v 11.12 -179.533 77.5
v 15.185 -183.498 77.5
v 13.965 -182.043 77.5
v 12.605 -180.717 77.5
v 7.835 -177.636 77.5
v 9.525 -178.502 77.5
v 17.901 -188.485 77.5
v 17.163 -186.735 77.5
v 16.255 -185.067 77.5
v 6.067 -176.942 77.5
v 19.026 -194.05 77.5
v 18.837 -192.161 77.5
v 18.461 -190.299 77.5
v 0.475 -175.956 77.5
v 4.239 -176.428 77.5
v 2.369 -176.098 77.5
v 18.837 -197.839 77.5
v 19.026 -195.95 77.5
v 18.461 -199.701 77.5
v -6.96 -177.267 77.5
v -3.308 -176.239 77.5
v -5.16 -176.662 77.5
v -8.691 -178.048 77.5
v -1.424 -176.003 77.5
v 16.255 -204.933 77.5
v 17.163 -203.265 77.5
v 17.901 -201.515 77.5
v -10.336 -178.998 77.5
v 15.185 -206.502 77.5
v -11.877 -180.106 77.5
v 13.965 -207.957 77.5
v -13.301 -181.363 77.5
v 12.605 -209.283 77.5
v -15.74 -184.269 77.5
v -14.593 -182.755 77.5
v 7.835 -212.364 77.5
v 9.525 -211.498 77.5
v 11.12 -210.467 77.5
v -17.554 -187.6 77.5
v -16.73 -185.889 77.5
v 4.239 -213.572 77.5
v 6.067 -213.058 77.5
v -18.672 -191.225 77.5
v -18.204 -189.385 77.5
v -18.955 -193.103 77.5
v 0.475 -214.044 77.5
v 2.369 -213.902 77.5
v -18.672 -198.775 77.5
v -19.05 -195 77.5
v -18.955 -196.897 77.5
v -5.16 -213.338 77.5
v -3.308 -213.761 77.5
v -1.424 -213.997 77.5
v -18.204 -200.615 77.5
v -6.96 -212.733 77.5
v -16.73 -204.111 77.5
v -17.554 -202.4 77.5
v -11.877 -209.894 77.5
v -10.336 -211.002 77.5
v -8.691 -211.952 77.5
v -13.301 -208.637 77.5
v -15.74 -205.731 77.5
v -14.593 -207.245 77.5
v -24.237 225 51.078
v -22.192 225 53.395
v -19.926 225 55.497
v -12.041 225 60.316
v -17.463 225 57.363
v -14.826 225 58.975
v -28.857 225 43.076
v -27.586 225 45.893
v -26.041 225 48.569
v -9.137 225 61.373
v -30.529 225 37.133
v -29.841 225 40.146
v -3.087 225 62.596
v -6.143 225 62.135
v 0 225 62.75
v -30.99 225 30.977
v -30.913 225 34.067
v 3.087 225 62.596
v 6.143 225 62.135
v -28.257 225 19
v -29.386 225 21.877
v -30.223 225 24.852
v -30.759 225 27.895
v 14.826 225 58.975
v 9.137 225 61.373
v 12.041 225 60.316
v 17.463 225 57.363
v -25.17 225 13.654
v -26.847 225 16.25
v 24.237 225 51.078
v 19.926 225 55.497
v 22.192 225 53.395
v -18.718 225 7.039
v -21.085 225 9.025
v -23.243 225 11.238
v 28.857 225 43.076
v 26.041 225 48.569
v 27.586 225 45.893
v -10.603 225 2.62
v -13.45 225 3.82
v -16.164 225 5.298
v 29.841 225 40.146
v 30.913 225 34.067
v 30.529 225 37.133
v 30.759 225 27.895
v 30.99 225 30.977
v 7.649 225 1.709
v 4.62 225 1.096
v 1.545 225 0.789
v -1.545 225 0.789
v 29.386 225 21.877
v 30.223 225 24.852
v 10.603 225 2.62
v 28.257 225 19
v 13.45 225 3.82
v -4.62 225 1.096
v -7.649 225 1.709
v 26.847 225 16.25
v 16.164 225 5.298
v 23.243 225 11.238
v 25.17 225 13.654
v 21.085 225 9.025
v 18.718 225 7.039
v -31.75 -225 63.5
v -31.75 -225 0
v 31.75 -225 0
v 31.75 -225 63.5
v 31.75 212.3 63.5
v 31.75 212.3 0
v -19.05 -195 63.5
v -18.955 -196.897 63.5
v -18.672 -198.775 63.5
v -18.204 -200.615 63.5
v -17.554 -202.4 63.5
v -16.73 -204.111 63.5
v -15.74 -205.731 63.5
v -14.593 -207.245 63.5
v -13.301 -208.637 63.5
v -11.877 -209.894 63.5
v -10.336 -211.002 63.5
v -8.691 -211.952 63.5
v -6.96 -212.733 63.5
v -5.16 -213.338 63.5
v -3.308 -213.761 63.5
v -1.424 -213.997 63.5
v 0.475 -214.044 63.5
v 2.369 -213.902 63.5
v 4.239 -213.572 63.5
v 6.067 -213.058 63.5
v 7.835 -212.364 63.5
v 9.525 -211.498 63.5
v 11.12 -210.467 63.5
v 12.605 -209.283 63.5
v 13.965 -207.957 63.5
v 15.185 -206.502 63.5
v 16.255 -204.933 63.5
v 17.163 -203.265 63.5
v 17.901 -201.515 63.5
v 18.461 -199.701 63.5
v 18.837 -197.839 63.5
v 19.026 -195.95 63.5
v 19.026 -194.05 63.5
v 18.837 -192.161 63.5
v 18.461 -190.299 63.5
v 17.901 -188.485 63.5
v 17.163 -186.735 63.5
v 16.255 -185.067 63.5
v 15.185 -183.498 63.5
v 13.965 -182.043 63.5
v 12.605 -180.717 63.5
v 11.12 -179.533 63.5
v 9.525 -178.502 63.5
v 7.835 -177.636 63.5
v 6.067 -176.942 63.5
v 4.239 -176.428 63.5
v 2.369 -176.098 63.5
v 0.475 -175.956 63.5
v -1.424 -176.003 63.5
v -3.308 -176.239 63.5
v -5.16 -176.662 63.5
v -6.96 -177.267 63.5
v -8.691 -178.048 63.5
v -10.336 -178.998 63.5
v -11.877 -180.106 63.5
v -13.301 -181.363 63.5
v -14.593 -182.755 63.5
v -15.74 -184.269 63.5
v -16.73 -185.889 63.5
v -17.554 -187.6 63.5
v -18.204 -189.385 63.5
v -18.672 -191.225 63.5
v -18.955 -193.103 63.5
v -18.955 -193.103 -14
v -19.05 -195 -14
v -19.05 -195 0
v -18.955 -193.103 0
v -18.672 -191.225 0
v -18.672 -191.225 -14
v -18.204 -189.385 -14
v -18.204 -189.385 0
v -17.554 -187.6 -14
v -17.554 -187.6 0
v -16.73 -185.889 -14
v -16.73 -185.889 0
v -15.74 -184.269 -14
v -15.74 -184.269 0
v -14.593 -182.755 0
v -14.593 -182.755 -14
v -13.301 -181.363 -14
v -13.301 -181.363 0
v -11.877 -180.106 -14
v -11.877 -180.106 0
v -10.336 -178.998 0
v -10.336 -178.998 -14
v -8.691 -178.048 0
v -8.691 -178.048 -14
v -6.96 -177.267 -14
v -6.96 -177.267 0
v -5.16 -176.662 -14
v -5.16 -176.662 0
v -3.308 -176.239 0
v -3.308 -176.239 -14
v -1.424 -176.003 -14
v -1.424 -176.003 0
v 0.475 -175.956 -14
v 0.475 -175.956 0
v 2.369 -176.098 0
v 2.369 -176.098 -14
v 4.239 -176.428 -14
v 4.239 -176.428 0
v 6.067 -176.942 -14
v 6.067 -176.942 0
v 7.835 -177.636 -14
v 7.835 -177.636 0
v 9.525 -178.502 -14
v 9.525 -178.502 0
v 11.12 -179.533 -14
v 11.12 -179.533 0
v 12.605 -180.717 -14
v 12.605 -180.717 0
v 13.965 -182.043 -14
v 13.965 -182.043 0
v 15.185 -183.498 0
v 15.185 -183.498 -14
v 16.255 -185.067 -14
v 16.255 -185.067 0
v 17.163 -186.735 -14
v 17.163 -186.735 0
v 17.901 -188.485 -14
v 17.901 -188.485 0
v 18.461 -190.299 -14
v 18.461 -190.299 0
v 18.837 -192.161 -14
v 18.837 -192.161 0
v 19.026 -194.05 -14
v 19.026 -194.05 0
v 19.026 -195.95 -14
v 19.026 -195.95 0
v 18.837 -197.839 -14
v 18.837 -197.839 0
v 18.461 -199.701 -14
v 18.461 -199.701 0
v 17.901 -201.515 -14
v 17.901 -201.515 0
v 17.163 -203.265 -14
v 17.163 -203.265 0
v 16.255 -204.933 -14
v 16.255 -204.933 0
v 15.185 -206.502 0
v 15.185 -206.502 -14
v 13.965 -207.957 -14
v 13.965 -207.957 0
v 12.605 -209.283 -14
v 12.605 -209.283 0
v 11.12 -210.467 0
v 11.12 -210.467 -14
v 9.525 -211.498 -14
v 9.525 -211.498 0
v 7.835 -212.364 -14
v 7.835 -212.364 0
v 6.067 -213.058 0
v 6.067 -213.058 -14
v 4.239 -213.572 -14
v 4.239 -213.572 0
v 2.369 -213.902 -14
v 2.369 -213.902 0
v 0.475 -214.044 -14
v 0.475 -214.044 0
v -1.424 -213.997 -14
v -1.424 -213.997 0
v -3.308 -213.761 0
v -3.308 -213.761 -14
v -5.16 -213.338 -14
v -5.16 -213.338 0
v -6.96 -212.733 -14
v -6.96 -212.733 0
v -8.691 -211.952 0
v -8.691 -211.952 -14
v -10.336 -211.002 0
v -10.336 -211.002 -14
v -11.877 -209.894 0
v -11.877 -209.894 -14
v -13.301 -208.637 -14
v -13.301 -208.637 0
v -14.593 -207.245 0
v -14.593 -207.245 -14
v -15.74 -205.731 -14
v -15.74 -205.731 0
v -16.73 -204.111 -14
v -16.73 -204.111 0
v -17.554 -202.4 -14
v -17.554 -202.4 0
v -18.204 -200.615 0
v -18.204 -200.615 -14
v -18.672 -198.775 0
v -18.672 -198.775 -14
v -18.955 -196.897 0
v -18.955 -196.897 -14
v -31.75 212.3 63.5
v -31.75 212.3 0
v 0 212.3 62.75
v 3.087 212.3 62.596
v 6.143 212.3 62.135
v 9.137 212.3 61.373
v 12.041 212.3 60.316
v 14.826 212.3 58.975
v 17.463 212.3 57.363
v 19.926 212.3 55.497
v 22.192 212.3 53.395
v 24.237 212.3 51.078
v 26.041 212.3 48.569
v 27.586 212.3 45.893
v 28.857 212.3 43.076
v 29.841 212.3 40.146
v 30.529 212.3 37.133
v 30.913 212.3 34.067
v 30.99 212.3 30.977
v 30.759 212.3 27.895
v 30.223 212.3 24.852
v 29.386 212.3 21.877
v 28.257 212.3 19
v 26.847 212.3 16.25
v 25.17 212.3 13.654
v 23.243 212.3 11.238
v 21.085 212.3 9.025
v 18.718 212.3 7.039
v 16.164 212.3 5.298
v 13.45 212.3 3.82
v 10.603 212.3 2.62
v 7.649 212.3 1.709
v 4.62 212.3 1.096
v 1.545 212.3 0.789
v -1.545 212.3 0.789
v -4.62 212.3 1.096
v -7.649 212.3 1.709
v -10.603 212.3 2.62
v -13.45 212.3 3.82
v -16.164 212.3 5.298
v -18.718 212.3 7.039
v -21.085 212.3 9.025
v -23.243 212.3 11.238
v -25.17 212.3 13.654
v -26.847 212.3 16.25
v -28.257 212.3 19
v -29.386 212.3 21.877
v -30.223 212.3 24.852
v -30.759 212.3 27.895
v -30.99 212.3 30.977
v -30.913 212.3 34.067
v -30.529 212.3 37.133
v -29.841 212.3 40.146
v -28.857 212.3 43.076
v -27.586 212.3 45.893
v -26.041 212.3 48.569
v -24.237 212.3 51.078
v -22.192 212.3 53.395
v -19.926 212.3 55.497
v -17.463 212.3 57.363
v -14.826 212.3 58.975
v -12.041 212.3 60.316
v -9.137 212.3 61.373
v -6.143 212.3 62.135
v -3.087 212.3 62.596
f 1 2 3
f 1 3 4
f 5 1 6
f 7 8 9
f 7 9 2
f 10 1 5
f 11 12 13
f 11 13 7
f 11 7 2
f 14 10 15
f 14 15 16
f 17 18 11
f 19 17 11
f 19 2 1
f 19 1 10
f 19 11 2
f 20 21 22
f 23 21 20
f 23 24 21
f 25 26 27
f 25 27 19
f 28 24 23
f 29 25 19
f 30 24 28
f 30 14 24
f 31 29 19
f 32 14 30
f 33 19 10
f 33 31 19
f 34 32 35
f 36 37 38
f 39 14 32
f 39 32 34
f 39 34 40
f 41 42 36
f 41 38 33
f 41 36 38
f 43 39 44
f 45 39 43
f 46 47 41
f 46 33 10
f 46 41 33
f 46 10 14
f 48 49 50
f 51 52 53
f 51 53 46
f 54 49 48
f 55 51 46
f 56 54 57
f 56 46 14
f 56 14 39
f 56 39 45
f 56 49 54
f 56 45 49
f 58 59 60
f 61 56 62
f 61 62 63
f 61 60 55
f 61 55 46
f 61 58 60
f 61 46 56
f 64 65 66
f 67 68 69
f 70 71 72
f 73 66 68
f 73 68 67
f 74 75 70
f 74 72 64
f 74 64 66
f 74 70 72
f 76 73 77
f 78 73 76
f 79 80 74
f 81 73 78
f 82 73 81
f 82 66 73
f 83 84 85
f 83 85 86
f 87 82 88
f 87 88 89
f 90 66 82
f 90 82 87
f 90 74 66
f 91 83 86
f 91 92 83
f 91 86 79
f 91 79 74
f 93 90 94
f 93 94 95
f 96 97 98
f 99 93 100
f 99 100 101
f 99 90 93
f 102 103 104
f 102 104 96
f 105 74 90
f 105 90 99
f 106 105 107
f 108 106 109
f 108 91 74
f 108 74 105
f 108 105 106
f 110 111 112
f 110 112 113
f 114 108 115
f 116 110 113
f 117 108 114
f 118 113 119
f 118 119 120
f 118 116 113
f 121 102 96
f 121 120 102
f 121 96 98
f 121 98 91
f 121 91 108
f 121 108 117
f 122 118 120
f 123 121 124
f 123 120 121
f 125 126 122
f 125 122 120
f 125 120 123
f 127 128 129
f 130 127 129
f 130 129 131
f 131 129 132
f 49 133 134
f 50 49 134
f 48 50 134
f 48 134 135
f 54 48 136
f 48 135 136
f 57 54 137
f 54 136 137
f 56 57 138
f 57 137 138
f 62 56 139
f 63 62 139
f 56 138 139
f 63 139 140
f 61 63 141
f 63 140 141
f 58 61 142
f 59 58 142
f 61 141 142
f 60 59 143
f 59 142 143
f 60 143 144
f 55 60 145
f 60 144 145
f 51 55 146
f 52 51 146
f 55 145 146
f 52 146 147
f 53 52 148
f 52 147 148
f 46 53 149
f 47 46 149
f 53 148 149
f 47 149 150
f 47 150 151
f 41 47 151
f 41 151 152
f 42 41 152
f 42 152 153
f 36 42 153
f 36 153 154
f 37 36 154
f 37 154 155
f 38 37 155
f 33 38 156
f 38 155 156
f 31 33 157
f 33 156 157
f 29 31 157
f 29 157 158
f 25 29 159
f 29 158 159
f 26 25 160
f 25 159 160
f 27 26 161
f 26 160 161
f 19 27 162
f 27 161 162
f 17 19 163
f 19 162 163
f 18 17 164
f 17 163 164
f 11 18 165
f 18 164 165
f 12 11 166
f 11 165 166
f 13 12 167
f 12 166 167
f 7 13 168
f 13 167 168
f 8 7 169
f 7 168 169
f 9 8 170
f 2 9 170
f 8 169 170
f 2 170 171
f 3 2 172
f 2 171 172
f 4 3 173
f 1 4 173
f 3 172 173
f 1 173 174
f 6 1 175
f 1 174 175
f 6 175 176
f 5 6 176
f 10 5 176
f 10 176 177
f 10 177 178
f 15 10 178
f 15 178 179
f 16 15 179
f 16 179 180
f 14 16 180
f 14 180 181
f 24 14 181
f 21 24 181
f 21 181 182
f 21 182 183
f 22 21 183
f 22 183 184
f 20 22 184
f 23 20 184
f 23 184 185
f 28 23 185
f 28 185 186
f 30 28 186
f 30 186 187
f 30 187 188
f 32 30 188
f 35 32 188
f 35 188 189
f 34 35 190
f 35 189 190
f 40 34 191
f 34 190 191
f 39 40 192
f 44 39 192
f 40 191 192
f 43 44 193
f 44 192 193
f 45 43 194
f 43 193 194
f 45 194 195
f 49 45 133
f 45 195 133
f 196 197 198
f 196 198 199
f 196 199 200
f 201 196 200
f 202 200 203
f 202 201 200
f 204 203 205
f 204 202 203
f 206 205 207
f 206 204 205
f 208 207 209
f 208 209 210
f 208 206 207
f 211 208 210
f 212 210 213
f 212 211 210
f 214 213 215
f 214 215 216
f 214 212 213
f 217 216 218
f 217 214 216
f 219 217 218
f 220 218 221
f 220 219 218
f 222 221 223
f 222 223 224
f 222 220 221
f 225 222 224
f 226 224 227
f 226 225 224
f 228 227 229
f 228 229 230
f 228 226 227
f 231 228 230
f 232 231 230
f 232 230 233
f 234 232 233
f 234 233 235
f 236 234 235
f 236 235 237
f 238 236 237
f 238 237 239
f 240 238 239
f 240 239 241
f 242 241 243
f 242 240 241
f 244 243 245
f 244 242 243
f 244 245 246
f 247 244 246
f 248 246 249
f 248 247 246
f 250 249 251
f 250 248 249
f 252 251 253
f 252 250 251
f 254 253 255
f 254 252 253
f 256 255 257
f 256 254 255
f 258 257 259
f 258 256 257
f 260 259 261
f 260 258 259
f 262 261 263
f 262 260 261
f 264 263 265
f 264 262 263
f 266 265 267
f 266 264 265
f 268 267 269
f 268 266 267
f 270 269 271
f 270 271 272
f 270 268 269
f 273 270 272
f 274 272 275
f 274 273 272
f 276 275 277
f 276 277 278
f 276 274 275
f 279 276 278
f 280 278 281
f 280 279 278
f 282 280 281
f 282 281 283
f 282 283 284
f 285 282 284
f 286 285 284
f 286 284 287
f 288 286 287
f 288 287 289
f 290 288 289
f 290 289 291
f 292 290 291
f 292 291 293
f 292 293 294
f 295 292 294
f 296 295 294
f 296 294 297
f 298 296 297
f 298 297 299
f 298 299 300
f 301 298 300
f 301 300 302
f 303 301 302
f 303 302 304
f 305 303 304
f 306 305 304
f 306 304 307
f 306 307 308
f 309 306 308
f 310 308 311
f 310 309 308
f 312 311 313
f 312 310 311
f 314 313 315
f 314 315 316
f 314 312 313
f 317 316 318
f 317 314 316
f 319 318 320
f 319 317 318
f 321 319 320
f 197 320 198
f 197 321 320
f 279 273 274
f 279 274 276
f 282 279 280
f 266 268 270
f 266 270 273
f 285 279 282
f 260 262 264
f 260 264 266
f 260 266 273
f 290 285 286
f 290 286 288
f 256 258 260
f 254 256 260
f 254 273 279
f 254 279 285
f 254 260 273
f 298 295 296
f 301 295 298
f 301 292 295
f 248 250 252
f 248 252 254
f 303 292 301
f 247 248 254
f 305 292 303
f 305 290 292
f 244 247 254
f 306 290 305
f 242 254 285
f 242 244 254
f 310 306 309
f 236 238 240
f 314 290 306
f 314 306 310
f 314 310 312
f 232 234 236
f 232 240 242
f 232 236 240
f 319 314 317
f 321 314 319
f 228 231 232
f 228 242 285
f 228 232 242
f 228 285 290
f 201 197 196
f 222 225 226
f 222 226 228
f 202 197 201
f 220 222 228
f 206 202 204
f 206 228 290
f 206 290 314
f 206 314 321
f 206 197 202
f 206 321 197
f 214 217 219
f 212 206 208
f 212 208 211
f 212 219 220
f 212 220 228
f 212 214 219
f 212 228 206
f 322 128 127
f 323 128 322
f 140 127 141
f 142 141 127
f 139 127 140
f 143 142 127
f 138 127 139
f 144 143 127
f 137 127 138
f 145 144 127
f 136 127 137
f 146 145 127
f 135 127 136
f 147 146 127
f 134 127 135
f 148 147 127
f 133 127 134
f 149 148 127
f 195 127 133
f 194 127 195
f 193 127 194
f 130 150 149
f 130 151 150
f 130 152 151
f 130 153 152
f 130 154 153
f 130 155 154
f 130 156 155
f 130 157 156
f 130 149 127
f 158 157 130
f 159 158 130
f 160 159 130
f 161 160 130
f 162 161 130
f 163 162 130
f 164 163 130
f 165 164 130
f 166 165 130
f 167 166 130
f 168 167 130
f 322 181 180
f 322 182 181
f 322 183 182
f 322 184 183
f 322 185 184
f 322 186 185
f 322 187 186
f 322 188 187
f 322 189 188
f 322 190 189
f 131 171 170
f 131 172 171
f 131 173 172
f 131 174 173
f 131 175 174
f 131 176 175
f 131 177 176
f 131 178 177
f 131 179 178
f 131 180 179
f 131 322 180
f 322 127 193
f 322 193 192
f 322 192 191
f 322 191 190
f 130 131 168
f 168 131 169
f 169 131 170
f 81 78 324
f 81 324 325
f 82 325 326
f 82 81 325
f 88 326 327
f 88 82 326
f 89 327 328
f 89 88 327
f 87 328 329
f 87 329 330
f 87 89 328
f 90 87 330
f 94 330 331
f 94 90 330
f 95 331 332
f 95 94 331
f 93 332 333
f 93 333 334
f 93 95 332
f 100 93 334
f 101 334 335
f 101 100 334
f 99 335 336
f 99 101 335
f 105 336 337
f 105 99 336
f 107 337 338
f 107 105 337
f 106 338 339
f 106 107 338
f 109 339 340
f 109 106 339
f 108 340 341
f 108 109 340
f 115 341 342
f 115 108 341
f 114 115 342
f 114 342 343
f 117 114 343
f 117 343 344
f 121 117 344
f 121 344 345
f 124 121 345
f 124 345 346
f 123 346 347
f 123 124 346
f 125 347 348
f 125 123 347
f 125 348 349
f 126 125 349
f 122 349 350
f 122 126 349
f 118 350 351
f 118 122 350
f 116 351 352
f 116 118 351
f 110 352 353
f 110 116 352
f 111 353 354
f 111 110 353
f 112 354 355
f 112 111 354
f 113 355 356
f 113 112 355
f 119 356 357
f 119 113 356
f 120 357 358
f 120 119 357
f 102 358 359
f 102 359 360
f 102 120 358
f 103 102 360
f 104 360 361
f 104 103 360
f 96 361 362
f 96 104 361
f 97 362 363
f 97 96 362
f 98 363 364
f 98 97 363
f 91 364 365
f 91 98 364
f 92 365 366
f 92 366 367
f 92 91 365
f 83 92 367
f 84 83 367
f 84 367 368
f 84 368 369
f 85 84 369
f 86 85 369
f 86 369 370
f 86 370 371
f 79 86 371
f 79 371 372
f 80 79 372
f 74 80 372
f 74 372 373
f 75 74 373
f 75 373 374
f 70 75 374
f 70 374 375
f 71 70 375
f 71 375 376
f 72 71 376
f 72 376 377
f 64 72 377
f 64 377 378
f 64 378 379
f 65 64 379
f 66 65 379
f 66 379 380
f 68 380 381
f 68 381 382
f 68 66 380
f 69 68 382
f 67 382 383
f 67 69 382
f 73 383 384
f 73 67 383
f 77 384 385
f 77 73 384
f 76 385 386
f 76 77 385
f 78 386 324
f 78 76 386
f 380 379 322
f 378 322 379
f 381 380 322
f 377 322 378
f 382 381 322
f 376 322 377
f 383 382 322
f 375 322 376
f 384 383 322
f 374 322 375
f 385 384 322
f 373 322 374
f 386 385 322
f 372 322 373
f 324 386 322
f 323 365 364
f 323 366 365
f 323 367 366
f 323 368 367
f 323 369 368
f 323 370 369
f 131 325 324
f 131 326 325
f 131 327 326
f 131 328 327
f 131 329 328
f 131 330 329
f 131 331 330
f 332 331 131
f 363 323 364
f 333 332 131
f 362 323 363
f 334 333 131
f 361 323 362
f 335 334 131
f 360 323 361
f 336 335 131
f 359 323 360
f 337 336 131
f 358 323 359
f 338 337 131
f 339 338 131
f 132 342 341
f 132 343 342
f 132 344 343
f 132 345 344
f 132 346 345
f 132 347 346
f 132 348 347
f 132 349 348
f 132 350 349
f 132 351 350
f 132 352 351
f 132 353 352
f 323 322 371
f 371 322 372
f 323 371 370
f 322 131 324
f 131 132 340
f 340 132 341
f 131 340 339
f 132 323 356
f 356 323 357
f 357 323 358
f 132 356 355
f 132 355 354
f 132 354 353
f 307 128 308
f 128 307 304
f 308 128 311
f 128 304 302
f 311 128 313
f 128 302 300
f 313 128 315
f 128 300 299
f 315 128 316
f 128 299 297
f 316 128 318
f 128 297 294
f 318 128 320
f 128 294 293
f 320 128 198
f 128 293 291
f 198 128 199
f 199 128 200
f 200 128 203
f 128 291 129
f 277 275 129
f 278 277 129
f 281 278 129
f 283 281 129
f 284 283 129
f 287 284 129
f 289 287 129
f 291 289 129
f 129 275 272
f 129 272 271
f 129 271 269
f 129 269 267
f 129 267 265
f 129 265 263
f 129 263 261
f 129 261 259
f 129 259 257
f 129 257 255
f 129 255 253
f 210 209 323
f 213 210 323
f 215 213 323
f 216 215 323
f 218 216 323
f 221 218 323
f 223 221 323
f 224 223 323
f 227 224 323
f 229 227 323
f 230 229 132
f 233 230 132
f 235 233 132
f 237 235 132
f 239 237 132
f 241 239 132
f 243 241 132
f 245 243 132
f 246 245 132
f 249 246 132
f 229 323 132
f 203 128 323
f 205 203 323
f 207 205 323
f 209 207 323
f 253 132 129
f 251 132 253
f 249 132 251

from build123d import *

# Parameters (mm, degrees)
CROQUIS2_W              = 63.5
CROQUIS2_H              = 450
SALIENTE_EXTRUIR1_DEPTH = 63.5
CROQUIS3_R              = 19.05
SALIENTE_EXTRUIR2_DEPTH = 14
SALIENTE_EXTRUIR3_START = 14
CROQUIS4_R              = 19.05
SALIENTE_EXTRUIR3_DEPTH = 14
CROQUIS5_W              = 63.5
CROQUIS5_H              = 63.5
CROQUIS5_R              = 31
CORTAR_EXTRUIR1_DEPTH   = 12.7


with BuildPart() as part:
    # Croquis2 → Saliente-Extruir1 (new body)
    with BuildSketch(Plane.XY):
        Rectangle(CROQUIS2_W, CROQUIS2_H)
    extrude(amount=SALIENTE_EXTRUIR1_DEPTH)

    # Croquis3 → Saliente-Extruir2 (add)
    with BuildSketch(Plane.XY.offset(63.5)):
        with Locations(Location((0, -195, 0), (0, 0, 180))):
            Circle(CROQUIS3_R)
    extrude(amount=SALIENTE_EXTRUIR2_DEPTH)

    # Croquis4 → Saliente-Extruir3 (add)
    with BuildSketch(Plane(origin=(0, 0, 0), x_dir=(-1, 0, 0), z_dir=(0, 0, -1)).offset(SALIENTE_EXTRUIR3_START)):
        with Locations((0, -195)):
            Circle(CROQUIS4_R)
    extrude(amount=-SALIENTE_EXTRUIR3_DEPTH)

    # Croquis5 → Cortar-Extruir1 (cut)
    with BuildSketch(Plane(origin=(0, 225, 0), x_dir=(1, 0, 0), z_dir=(0, 1, 0))):
        with Locations((0, -31.75)):
            Rectangle(CROQUIS5_W, CROQUIS5_H)
        with Locations(Location((0, -31.75, 0), (0, 0, 270))):
            Circle(CROQUIS5_R, mode=Mode.SUBTRACT)
    extrude(amount=-CORTAR_EXTRUIR1_DEPTH, mode=Mode.SUBTRACT)


solid = part.part
